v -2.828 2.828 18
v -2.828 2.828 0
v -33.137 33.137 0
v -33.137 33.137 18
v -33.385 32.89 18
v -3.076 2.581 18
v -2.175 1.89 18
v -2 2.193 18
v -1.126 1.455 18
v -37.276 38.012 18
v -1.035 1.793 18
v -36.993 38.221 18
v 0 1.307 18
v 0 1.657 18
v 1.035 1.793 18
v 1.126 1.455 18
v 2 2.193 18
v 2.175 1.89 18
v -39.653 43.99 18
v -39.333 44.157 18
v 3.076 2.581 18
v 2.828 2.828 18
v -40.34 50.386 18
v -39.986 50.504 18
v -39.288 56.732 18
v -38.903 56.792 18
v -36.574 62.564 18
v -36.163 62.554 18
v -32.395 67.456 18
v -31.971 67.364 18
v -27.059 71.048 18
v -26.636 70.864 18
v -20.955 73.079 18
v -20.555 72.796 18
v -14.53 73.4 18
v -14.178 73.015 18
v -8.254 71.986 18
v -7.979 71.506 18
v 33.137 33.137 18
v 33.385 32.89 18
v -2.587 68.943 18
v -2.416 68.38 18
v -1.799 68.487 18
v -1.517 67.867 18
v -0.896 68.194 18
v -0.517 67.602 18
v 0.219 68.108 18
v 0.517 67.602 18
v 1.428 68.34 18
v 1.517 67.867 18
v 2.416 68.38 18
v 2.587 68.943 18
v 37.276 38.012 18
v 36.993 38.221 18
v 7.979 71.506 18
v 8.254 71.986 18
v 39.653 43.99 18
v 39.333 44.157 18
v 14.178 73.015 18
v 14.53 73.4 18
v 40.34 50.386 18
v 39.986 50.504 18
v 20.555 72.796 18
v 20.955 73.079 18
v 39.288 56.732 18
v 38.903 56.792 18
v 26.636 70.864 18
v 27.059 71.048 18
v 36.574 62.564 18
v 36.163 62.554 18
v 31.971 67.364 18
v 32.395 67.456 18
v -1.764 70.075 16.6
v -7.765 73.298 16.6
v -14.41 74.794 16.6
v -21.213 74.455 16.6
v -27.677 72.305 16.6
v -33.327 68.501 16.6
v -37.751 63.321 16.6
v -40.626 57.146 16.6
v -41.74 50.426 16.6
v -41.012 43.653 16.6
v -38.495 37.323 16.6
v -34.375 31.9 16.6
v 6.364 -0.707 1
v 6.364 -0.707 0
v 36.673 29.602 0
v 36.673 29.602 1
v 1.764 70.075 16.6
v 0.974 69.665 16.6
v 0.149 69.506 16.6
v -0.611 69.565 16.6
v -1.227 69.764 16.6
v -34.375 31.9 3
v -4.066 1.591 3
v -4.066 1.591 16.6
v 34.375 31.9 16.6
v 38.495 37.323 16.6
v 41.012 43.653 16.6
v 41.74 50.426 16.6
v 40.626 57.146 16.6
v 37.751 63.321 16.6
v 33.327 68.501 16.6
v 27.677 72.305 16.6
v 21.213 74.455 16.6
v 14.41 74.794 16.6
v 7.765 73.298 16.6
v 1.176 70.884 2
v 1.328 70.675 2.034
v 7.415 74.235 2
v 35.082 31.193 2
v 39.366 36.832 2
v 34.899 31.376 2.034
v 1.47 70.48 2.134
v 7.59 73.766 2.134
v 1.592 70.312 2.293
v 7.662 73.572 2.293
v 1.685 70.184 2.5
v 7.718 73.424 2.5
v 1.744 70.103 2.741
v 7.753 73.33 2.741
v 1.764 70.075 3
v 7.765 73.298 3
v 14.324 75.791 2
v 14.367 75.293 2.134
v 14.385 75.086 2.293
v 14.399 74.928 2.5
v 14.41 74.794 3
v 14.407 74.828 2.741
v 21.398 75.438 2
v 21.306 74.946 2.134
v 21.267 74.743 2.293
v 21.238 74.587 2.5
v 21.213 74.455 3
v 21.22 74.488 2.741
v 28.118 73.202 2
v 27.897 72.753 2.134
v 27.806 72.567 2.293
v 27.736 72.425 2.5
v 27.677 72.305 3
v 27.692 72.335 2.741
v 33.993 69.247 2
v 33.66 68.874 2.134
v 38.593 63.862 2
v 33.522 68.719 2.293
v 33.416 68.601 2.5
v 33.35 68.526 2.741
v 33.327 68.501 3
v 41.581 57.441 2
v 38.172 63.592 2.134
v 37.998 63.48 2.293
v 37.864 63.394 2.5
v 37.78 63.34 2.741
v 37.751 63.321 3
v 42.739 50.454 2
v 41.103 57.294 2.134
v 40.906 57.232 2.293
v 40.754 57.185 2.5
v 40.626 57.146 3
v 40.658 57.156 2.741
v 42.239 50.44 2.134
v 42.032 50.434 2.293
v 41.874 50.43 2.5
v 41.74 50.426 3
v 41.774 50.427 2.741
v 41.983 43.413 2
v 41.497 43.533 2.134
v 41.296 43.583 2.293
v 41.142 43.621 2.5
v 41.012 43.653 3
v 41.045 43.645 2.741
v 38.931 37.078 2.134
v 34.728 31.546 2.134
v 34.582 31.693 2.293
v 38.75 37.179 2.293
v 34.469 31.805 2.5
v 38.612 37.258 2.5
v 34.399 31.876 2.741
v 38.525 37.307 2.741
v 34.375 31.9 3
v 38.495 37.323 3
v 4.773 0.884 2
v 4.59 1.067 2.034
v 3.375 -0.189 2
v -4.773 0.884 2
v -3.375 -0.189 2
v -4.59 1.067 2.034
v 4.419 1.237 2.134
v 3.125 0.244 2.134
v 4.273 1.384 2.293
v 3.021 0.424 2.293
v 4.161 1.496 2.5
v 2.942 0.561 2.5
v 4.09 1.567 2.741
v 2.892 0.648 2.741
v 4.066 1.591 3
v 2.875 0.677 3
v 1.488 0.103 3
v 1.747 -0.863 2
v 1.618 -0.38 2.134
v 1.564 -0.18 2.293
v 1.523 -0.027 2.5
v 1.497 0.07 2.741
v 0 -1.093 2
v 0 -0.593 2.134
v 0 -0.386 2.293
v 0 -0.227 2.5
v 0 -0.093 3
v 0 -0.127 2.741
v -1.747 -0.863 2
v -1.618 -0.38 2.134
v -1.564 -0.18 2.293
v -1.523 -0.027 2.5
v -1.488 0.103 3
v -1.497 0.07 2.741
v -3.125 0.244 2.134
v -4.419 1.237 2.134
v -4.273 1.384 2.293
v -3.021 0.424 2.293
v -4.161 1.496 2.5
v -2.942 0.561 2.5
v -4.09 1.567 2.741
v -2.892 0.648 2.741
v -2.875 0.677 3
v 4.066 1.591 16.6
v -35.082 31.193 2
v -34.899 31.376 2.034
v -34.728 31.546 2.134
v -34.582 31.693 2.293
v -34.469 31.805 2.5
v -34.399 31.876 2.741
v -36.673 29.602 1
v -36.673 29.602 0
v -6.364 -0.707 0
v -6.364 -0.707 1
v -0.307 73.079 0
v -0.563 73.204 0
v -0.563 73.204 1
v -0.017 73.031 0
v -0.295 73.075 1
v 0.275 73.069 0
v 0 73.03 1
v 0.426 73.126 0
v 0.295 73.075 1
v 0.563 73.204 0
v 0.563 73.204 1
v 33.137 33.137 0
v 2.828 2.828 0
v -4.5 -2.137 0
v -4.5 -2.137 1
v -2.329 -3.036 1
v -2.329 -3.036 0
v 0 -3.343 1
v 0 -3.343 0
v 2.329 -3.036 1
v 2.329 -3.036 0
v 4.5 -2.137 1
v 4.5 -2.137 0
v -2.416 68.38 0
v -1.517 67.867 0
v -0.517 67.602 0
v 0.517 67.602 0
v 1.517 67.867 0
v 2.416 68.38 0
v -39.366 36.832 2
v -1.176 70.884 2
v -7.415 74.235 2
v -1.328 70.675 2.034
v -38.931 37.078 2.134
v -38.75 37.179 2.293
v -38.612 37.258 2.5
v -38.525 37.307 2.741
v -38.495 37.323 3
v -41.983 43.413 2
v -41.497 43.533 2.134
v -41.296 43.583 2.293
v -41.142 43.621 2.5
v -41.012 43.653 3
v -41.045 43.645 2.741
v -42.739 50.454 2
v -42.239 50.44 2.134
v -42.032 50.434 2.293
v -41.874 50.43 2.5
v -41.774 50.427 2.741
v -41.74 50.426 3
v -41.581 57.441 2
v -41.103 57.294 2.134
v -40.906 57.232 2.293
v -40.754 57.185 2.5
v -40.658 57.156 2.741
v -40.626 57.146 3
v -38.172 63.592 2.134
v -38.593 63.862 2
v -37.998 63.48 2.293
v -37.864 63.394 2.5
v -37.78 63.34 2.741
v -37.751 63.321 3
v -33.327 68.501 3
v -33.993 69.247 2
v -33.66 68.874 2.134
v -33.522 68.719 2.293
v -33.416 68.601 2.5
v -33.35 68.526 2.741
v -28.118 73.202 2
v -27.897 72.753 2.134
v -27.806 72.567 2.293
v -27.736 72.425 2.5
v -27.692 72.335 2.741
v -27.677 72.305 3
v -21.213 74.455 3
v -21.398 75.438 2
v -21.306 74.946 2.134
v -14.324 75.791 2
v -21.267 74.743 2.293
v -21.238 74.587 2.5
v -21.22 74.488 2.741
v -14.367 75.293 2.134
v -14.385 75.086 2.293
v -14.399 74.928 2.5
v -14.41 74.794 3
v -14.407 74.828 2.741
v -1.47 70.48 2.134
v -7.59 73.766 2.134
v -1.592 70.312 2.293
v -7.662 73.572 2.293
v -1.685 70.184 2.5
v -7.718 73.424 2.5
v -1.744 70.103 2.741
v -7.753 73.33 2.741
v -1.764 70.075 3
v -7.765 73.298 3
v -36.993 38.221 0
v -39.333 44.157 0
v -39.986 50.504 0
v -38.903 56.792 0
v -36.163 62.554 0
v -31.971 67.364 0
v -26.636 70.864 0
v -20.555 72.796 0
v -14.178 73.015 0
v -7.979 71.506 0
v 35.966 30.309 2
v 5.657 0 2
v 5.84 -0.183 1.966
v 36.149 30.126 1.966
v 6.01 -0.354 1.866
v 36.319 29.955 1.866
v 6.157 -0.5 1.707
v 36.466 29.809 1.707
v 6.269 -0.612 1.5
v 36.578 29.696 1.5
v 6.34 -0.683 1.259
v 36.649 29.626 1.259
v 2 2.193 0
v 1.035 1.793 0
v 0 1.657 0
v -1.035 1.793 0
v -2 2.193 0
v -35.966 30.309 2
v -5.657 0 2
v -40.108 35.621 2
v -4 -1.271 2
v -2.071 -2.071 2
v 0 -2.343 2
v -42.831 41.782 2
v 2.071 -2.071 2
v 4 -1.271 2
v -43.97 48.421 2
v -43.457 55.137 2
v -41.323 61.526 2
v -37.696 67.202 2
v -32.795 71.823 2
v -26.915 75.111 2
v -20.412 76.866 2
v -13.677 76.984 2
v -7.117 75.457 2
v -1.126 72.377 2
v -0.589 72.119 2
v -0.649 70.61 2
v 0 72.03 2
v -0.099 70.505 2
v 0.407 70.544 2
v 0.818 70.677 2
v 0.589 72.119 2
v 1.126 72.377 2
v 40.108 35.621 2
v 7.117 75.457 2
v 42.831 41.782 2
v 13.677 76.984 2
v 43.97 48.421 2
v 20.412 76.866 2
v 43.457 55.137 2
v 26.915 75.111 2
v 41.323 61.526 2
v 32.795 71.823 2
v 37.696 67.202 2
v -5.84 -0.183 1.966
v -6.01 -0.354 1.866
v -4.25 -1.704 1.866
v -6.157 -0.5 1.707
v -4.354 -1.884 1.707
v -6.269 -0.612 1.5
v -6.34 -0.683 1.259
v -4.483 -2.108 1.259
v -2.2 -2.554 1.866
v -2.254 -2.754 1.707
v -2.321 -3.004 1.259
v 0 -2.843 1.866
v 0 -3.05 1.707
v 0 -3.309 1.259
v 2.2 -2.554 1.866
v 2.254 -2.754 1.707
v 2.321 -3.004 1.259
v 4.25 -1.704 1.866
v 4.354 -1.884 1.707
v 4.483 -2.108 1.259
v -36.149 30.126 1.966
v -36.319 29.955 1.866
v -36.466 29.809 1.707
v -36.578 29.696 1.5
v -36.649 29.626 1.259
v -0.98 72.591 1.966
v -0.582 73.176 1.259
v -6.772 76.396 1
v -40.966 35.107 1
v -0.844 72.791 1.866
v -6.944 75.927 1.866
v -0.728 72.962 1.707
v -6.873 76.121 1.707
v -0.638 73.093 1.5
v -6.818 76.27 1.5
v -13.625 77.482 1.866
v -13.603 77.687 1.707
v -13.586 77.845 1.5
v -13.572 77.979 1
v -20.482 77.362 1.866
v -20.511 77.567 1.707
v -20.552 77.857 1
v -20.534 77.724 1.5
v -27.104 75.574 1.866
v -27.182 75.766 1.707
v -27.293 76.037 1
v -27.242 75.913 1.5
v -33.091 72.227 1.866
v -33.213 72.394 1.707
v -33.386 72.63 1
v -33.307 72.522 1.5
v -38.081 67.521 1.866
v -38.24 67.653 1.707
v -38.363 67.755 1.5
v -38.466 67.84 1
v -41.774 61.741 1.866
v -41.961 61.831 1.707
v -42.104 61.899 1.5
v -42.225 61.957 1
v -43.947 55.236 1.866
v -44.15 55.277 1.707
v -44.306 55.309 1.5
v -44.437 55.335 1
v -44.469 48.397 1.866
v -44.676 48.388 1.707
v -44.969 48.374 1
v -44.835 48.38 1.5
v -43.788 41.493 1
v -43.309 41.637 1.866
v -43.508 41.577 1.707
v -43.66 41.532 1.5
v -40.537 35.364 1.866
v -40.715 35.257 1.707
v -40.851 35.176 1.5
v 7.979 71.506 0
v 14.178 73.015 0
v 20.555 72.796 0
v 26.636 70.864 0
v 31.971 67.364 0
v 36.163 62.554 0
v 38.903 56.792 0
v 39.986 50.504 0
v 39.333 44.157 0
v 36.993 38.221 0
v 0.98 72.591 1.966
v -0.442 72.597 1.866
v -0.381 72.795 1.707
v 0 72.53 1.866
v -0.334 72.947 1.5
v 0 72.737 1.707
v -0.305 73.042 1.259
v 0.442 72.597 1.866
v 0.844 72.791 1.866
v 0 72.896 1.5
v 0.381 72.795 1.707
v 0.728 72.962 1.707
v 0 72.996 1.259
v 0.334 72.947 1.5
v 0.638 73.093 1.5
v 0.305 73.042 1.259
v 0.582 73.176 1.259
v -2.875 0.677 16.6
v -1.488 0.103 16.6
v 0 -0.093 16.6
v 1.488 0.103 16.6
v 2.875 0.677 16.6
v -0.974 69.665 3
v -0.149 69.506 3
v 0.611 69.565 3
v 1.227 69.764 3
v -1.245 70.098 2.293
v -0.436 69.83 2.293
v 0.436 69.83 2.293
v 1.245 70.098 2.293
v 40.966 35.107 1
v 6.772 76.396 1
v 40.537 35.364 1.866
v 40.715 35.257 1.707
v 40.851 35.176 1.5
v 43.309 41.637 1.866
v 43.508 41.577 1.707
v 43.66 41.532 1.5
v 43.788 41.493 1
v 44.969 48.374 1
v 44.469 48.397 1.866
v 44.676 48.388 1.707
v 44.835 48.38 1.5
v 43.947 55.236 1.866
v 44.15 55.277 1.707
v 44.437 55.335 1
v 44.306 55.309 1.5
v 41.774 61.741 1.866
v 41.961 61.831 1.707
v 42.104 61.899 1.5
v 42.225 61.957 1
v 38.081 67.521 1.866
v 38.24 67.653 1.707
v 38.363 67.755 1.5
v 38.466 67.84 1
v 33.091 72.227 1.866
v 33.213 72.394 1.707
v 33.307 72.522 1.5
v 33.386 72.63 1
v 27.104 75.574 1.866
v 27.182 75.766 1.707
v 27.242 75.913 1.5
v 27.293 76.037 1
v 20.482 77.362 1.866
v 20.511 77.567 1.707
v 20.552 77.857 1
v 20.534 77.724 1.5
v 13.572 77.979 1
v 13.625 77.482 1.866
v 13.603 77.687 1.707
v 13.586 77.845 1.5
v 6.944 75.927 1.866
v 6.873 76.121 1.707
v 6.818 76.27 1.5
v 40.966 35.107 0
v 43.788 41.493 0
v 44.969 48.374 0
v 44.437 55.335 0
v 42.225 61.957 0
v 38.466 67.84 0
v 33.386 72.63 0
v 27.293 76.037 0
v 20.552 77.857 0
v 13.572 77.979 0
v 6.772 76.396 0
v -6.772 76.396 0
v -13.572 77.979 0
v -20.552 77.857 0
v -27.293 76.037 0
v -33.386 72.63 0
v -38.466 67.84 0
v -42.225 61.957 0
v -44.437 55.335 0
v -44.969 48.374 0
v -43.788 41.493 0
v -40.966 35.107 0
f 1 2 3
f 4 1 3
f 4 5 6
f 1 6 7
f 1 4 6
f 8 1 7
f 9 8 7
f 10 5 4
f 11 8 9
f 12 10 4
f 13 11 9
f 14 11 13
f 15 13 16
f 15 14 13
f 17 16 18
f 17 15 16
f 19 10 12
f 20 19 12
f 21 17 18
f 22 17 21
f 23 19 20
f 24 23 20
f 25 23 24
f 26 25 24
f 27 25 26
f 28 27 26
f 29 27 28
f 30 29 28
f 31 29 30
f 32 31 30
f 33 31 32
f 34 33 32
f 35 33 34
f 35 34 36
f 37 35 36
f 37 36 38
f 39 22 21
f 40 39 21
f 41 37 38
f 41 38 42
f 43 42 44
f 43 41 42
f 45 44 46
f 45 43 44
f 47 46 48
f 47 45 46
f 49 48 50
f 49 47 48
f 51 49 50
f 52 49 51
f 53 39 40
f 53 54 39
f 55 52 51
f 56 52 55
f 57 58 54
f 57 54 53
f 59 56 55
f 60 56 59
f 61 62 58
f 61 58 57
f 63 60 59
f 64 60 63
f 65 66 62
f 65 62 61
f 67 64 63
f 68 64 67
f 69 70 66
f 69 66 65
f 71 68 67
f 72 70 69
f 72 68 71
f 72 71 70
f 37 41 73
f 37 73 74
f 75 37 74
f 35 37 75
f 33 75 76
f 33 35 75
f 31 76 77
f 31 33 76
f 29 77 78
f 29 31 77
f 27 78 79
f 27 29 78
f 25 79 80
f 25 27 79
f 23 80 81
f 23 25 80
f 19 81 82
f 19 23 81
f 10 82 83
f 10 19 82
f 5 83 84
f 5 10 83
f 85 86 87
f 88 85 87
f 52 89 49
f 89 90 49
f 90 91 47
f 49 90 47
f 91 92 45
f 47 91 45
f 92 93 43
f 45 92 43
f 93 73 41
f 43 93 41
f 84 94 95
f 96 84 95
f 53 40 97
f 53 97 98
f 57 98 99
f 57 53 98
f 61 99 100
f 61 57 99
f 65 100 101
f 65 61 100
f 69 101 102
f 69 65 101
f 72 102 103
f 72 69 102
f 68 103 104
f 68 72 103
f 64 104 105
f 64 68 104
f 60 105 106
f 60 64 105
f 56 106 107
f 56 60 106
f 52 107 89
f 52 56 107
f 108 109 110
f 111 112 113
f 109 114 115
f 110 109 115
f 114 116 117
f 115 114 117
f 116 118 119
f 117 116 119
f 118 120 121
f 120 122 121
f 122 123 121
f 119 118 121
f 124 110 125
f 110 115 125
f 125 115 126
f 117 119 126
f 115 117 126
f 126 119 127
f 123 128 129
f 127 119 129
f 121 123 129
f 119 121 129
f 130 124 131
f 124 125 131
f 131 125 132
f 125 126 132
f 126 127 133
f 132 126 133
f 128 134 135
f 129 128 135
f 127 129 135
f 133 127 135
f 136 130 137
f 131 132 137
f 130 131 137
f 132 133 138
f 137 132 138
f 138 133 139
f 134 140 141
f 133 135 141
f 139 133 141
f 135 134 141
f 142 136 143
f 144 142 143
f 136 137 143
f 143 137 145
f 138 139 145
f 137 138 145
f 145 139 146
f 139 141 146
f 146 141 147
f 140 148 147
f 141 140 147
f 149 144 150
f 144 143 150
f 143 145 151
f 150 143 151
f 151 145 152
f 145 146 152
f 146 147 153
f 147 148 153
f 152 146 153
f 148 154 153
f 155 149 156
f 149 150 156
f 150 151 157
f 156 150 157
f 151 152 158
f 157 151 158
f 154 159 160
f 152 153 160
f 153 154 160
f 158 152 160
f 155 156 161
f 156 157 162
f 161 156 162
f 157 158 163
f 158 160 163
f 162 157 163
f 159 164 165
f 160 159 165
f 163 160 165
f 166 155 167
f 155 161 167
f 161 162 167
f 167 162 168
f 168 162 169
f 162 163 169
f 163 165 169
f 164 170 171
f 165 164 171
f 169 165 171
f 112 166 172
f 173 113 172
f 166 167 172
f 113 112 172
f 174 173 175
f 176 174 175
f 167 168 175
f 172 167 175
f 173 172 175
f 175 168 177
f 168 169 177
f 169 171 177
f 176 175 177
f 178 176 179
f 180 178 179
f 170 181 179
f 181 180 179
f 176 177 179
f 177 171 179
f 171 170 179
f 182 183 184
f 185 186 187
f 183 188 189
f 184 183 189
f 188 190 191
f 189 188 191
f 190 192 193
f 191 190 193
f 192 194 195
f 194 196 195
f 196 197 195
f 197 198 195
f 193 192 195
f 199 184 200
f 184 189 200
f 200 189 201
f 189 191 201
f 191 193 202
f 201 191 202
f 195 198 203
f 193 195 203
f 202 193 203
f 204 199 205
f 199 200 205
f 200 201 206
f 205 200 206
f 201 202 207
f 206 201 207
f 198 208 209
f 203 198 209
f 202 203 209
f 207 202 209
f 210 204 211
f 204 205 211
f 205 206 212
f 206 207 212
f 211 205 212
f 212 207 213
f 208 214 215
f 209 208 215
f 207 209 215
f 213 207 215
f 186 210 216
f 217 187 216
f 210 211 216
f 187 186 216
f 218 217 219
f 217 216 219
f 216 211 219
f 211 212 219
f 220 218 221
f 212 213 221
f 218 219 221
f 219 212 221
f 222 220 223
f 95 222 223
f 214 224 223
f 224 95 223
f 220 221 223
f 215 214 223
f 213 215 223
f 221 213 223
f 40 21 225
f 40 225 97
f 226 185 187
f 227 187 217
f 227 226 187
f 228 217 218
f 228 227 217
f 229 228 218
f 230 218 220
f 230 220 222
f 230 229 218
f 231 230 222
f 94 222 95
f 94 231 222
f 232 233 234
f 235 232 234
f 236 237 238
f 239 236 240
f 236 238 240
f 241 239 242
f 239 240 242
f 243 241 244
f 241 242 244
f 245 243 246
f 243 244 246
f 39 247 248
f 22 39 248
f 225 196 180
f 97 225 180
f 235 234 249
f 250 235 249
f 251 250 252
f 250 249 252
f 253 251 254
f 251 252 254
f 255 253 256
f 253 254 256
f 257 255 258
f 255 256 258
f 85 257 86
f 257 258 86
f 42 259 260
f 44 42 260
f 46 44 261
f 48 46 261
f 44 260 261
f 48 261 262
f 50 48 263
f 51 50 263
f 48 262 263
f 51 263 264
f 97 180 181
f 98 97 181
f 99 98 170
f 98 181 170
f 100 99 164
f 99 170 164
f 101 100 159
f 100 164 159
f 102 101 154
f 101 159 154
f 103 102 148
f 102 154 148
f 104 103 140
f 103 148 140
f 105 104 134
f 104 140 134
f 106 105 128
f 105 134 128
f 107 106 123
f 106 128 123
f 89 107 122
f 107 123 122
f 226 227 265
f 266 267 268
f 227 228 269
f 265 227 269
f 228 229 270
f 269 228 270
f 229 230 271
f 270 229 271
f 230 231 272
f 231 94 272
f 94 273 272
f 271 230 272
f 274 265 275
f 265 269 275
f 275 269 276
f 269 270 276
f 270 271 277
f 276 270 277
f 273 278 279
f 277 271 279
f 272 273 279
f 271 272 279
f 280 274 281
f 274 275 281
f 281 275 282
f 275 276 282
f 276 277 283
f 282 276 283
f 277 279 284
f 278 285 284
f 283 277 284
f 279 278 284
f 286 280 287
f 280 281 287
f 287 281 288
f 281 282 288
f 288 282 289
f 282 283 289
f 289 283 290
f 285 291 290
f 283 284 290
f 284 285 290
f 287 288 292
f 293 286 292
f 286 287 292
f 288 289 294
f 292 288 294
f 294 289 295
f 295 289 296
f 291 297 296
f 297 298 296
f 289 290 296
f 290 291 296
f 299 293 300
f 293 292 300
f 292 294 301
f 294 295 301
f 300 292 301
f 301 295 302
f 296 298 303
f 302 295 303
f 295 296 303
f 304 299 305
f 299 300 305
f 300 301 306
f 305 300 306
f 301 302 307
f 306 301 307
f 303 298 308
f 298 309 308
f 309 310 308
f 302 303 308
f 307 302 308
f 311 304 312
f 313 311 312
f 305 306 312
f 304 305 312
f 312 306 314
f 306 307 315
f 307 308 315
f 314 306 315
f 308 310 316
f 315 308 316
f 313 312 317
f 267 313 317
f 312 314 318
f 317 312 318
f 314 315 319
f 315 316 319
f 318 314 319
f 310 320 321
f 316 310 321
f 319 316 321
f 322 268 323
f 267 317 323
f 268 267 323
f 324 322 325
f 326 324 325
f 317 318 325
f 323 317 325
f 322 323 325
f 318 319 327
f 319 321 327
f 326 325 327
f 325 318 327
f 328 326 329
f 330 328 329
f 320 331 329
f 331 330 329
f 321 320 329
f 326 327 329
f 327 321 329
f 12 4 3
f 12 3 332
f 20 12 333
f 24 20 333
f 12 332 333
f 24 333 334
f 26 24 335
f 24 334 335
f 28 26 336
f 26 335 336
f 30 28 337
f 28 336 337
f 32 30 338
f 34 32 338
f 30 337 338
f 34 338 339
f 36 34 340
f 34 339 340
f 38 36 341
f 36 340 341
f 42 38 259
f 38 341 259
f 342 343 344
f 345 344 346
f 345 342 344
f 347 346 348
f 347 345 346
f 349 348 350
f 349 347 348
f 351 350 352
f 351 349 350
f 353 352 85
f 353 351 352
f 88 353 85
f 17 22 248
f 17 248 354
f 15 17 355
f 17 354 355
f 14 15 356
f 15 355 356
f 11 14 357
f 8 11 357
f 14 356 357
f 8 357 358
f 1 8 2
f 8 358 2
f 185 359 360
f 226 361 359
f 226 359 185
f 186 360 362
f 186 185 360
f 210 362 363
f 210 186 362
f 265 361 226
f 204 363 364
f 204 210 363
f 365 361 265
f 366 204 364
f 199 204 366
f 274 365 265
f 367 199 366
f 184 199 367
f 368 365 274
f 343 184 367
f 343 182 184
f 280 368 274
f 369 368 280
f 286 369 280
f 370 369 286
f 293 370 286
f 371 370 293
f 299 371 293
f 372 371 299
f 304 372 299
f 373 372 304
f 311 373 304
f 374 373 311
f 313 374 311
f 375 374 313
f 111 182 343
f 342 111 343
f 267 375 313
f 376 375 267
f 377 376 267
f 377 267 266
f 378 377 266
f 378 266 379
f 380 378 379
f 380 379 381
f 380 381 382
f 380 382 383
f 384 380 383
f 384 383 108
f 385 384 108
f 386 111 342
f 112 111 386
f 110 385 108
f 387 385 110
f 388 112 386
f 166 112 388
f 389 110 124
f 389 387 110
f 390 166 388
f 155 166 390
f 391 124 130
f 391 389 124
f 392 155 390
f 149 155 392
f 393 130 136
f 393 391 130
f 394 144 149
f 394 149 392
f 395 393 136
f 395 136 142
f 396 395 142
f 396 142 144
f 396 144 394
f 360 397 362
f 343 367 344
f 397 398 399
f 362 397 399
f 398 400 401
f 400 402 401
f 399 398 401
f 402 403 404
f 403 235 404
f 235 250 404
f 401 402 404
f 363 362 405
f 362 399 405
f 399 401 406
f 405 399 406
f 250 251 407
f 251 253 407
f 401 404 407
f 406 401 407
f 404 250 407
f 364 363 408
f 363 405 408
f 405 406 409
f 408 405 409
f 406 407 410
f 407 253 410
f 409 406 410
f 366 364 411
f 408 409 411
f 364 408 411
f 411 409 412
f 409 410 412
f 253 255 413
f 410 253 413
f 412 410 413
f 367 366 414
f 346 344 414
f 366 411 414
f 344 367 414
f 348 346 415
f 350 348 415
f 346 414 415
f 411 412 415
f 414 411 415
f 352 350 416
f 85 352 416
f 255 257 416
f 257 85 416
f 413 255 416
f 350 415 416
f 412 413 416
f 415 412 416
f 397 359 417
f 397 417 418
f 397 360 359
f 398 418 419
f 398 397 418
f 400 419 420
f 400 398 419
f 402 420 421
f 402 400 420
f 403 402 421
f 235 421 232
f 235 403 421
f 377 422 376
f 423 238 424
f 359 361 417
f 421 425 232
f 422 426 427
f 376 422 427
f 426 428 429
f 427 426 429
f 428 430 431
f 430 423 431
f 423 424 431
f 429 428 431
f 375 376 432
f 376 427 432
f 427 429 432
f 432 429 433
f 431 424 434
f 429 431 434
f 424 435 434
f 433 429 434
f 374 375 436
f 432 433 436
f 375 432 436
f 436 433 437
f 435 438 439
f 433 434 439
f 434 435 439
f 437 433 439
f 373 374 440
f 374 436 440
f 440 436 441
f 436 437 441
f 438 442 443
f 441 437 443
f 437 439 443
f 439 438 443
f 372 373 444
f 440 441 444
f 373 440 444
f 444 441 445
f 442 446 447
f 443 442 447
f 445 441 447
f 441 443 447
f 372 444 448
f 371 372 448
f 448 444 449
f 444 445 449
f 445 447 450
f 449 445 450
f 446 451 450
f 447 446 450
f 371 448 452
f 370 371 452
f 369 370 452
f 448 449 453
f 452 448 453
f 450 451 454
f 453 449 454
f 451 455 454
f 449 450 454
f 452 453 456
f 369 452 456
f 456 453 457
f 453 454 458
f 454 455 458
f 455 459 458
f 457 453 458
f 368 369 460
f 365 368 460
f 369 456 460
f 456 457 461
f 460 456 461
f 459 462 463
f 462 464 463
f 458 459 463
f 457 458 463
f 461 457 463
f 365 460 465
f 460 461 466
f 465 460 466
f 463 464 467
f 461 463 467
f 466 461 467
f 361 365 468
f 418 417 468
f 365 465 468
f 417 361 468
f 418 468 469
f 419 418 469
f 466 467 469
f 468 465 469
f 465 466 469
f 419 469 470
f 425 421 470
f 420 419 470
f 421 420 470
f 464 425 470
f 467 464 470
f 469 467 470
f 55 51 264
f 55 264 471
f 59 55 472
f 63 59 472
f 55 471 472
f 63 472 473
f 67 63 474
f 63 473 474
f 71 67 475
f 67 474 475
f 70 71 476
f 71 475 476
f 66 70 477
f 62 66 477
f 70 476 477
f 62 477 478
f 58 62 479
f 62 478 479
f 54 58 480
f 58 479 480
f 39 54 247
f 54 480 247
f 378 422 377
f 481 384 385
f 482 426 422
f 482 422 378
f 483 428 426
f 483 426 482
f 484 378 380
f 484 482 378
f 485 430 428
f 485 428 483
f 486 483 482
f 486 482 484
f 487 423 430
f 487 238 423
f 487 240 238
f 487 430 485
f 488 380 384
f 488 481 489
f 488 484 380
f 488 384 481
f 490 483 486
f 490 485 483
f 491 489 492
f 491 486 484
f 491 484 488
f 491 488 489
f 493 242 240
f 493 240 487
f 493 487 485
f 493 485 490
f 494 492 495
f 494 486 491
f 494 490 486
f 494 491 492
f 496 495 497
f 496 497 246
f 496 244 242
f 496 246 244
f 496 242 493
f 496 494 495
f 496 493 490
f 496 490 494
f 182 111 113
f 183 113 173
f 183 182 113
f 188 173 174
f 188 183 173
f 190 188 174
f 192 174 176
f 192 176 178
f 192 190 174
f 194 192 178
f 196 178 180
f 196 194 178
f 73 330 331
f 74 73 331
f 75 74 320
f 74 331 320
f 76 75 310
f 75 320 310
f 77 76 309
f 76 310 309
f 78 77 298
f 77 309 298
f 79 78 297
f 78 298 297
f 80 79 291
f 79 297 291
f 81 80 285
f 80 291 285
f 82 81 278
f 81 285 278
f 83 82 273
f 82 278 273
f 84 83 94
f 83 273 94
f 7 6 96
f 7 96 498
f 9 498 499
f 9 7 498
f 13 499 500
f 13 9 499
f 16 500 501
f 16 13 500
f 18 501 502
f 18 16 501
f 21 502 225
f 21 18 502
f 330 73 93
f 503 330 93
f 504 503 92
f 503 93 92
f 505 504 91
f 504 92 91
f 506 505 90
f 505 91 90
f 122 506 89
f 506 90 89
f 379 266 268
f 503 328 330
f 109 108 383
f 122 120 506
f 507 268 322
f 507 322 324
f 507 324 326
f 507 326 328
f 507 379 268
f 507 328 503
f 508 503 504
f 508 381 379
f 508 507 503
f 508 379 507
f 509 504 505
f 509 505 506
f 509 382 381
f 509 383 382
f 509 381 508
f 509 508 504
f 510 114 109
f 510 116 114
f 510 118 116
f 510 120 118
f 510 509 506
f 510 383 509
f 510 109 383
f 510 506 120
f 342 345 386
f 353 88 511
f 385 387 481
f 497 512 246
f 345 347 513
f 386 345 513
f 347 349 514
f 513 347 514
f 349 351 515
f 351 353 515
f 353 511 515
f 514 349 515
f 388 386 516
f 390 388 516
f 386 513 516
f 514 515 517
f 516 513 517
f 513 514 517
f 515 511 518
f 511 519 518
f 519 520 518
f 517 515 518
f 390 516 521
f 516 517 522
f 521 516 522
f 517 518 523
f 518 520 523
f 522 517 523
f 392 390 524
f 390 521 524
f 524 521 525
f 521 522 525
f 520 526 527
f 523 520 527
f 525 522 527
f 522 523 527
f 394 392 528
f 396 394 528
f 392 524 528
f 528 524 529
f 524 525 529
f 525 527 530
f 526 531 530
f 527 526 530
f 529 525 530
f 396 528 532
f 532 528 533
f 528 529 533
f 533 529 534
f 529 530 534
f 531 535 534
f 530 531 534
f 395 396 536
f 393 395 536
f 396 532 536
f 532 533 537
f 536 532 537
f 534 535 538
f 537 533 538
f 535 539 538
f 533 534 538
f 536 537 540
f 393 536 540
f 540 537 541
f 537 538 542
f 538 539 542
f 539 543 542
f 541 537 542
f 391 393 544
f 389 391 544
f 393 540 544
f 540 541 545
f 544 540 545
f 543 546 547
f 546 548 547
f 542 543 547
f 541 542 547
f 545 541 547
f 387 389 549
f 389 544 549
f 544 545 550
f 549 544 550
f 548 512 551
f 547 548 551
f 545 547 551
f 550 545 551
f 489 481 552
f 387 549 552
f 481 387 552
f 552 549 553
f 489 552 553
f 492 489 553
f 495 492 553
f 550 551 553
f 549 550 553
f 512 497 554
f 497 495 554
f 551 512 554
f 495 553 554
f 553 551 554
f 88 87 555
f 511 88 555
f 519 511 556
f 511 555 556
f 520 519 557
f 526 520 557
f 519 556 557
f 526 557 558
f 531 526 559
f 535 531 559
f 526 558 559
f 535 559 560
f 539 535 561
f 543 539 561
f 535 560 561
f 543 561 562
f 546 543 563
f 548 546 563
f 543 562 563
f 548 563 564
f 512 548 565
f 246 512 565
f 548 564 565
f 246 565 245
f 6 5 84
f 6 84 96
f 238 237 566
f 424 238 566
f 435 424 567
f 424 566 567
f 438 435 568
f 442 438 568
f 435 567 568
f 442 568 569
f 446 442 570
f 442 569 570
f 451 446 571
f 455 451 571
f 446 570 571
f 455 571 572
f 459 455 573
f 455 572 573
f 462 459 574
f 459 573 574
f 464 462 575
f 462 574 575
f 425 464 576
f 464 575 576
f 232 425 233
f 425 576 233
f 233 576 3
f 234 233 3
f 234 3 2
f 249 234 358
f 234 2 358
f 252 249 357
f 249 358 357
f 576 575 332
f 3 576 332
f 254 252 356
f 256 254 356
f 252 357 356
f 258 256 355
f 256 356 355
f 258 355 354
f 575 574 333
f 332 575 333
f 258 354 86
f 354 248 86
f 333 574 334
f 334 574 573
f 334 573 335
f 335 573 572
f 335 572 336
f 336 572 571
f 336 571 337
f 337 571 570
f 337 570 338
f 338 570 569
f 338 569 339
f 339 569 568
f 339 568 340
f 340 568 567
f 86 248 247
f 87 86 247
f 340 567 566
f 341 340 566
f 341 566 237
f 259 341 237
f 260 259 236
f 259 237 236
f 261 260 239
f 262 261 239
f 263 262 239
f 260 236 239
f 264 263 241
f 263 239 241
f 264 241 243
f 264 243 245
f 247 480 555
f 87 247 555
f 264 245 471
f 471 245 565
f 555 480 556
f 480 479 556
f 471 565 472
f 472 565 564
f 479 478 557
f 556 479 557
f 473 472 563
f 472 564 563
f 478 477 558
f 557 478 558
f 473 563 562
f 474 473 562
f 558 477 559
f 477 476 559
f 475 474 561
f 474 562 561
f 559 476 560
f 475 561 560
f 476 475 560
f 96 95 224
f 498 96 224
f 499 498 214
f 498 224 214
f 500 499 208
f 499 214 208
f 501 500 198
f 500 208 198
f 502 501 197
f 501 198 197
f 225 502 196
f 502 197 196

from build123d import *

# Parameters (mm, degrees)
F1_DEPTH = 18
F2_DEPTH = 2
F3_R     = 3
F4_R     = 1
F5_SIZE  = 1.4


with BuildPart() as f1:
    # F0 (on Top) → F1 (new body)
    with BuildSketch(Plane.XY):
        with BuildLine():
            Line((4.065864, 1.59099), (34.374522, 31.899648))
            ThreePointArc((34.374522, 31.899648), (34.963359, 66.902619), (0, 68.668465))
            ThreePointArc((0, 68.668465), (-34.963359, 66.902619), (-34.374522, 31.899648))
            Line((-34.374522, 31.899648), (-4.065864, 1.59099))
            ThreePointArc((-4.065864, 1.59099), (0, -0.093146), (4.065864, 1.59099))
        make_face()
        with BuildLine():
            ThreePointArc((2.828427, 2.828427), (0, 1.656854), (-2.828427, 2.828427))
            Line((-2.828427, 2.828427), (-33.137085, 33.137085))
            ThreePointArc((-33.137085, 33.137085), (-34.231441, 65.102225), (-2.415992, 68.380169))
            ThreePointArc((-2.415992, 68.380169), (0, 67.568113), (2.415992, 68.380169))
            ThreePointArc((2.415992, 68.380169), (34.231441, 65.102225), (33.137085, 33.137085))
            Line((33.137085, 33.137085), (2.828427, 2.828427))
        make_face(mode=Mode.SUBTRACT)
    extrude(amount=F1_DEPTH)

    # F0 (on Top) → F2 (join)
    with BuildSketch(Plane.XY):
        with BuildLine():
            Line((-36.672619, 29.601551), (-6.363961, -0.707107))
            ThreePointArc((-6.363961, -0.707107), (0, -3.343146), (6.363961, -0.707107))
            Line((6.363961, -0.707107), (36.672619, 29.601551))
            ThreePointArc((36.672619, 29.601551), (38.245177, 68.103217), (0, 72.810414))
            ThreePointArc((0, 72.810414), (-38.245177, 68.103217), (-36.672619, 29.601551))
        make_face()
        with BuildLine():
            ThreePointArc((0, 68.668465), (34.963359, 66.902619), (34.374522, 31.899648))
            Line((34.374522, 31.899648), (4.065864, 1.59099))
            ThreePointArc((4.065864, 1.59099), (0, -0.093146), (-4.065864, 1.59099))
            Line((-4.065864, 1.59099), (-34.374522, 31.899648))
            ThreePointArc((-34.374522, 31.899648), (-34.963359, 66.902619), (0, 68.668465))
        make_face(mode=Mode.SUBTRACT)
    extrude(amount=F2_DEPTH)

    # F3
    f3_edges = [f1.edges().sort_by_distance(p)[0] for p in [
        (0, 68.668465, 10),
    ]]
    fillet(f3_edges, radius=F3_R)

    # F4
    f4_edges = [f1.edges().sort_by_distance(p)[0] for p in [
        (35.715275, 66.061313, 2),
        (38.245177, 68.103217, 2),
        (0, 72.810414, 1),
    ]]
    fillet(f4_edges, radius=F4_R)

    # F5
    f5_edges = [f1.edges().sort_by_distance(p)[0] for p in [
        (35.715275, 66.061313, 18),
    ]]
    chamfer(f5_edges, length=F5_SIZE)


solid = f1.part
